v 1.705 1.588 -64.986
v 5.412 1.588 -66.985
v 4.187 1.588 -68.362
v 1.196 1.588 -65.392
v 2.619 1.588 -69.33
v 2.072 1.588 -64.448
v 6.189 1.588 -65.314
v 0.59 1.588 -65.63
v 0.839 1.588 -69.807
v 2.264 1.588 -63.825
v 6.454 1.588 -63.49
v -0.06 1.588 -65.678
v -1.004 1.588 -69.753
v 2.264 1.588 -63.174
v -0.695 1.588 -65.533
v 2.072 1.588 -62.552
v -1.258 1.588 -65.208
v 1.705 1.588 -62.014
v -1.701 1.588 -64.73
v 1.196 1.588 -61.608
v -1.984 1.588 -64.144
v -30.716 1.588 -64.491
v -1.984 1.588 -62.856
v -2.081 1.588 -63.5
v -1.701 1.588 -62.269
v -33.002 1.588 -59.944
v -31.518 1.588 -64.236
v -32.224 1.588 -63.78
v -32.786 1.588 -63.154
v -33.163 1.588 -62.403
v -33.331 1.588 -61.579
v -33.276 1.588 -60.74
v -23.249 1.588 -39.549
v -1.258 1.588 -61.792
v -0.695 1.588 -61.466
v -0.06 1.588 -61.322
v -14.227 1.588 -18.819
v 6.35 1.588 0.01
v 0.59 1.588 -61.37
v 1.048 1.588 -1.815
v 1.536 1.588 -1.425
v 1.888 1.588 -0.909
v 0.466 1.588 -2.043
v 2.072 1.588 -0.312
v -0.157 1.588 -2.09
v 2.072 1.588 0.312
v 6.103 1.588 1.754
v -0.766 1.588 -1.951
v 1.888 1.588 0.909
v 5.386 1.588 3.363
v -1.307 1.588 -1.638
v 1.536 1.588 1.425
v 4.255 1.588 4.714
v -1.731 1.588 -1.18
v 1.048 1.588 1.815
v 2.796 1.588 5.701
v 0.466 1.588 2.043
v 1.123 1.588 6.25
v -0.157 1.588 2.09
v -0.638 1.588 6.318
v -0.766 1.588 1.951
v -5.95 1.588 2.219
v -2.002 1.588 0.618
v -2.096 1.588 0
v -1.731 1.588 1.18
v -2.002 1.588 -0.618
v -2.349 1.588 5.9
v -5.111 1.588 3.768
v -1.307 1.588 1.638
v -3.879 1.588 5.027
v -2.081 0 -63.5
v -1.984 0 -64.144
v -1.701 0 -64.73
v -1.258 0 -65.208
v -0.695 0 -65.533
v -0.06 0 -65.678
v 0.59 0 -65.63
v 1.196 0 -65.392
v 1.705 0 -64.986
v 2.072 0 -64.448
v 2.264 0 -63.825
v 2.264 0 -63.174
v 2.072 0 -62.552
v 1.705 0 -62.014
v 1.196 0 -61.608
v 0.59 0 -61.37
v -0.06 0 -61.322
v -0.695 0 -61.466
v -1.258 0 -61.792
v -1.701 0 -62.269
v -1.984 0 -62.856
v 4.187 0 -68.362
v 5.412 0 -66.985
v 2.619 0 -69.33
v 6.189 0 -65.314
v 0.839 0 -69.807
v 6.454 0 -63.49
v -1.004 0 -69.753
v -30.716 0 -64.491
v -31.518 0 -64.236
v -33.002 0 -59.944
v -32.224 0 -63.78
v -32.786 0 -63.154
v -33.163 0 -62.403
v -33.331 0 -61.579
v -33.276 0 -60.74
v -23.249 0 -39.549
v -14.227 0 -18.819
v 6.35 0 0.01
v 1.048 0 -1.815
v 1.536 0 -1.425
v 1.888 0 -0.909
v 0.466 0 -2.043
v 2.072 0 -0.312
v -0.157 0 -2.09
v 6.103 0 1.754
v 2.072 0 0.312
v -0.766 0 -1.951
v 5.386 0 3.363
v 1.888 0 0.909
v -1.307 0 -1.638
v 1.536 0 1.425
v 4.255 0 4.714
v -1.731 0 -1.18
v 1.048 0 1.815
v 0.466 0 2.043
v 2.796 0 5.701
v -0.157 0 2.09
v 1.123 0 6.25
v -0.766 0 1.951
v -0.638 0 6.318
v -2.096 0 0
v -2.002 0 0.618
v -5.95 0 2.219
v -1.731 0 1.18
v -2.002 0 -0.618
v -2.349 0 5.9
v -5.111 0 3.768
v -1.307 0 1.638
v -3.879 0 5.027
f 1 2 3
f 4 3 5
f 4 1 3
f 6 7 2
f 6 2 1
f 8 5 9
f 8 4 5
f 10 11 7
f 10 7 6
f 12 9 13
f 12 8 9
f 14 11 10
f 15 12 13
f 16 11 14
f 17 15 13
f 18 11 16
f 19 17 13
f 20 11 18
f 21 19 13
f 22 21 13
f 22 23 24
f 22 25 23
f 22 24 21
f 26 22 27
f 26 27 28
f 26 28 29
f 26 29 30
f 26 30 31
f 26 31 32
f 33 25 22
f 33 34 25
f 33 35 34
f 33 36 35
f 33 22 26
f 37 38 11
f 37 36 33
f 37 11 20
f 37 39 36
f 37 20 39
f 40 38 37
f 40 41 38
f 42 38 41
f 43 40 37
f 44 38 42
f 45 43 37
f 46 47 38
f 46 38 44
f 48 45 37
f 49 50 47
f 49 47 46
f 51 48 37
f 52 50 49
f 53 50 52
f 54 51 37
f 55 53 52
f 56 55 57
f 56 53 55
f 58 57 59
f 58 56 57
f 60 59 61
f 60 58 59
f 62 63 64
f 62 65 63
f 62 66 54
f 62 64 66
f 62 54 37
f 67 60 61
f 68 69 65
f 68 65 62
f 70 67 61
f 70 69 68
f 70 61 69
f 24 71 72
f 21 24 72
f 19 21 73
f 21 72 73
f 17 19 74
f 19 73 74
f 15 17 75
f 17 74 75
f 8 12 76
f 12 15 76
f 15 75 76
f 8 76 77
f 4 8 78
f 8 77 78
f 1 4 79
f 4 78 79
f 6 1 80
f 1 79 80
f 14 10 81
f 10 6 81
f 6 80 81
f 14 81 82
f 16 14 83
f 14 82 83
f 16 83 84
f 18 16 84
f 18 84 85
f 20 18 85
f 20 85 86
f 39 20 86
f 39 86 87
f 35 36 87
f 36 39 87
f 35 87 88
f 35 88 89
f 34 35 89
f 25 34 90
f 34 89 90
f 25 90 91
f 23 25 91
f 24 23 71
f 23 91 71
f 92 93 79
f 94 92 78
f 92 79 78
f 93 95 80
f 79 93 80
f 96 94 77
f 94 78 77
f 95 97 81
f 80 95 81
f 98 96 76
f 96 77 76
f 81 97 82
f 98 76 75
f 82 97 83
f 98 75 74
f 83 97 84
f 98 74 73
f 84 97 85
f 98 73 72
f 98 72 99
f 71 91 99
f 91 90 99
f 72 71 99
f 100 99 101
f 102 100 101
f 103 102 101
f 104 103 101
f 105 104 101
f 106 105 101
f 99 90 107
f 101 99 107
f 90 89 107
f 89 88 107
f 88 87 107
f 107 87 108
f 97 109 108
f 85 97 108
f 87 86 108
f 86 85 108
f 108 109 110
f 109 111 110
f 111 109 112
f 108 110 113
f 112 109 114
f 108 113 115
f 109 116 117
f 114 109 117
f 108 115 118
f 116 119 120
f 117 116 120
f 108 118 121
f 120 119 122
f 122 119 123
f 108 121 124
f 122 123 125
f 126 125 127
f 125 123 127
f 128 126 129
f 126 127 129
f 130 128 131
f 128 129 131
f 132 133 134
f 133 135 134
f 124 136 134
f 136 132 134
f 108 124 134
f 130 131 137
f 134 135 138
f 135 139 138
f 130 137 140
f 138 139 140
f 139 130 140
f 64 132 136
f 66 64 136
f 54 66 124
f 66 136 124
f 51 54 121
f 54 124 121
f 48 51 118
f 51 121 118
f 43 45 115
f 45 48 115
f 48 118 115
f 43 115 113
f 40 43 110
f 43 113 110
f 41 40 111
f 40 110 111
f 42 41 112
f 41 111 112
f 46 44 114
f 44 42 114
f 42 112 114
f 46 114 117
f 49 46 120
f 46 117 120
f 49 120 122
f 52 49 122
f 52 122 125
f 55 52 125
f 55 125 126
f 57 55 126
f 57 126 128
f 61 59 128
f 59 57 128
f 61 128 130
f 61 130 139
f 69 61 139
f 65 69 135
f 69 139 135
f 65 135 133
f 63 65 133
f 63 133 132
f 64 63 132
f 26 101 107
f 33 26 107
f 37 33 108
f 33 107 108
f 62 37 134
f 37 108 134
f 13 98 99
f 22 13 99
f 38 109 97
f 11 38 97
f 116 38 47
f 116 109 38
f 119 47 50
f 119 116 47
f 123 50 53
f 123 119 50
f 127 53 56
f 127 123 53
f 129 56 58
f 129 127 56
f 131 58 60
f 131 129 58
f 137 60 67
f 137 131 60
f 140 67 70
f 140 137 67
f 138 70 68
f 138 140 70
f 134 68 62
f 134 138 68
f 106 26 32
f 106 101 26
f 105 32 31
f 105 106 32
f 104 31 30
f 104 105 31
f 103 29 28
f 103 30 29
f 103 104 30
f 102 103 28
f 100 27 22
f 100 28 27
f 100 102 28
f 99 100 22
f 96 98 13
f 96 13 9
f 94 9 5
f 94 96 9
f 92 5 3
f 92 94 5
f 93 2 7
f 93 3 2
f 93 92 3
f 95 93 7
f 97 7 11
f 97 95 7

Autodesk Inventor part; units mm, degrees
ref_plane "YZ Plane" through (0, 0, 0) normal (1, 0, 0) x (0, 1, 0)
ref_plane "XZ Plane" through (0, 0, 0) normal (0, 1, 0) x (-1, 0, 0)
ref_plane "XY Plane" through (0, 0, 0) normal (0, 0, 1) x (1, 0, 0)
sketch "main" plane through (0, 0, 0) normal (0, 0, 1) x (1, 0, 0)
  circle A0 centre (31.4944, -42.9627) radius 2.1844
  arc A1 (31.4944, -49.3127) -> (37.7453, -41.8453) centre (31.4944, -42.9627) ccw
  arc A2 (-34.2347, -37.0168) -> (-32.0056, -49.3127) centre (-32.0056, -42.9627) ccw
  arc A3 (-34.2347, -37.0168) -> (27.8848, -9.8628) centre (-257.1487, 557.5708) ccw
  line L0 (37.7453, -41.8453) -> (32.4355, -12.1413)
  line L1 (-32.0056, -49.3127) -> (31.4944, -49.3127)
  arc A4 (32.4355, -12.1413) -> (27.8848, -9.8628) centre (29.31, -12.7) ccw
  circle A5 centre (-32.0056, -42.9627) radius 2.0955
  point P0 (5.1717, -33.3366)
  point P1 (31.6842, -7.9384)
  dimension "d0" = 1270
  dimension "d1" = 12.7
  dimension "d2" = 12.7
  dimension "d3" = 3.175
  dimension "d4" = 4.191
sketch "Sketch1" plane through (0, 0, 0) normal (0, 1, 0) x (-1, 0, 0)
  circle A0 centre (-0.1035, -63.4999) radius 2.1844
  arc A1 (-6.4535, -63.4896) -> (1.0037, -69.7526) centre (-0.1035, -63.4999) ccw
  arc A2 (5.9495, 2.2194) -> (-6.35, 0.0103) centre (0, 0) ccw
  arc A3 (5.9495, 2.2194) -> (33.0022, -59.9443) centre (600.8995, 224.1642) ccw
  line L0 (1.0037, -69.7526) -> (30.7163, -64.4912)
  line L1 (-6.35, 0.0103) -> (-6.4535, -63.4896)
  arc A4 (30.7163, -64.4912) -> (33.0022, -59.9443) centre (30.1627, -61.3648) ccw
  circle A5 centre (0, 0) radius 2.0955
  point P0 (0, 0)
extrude "Extrusion1" add sketch "Sketch1" along normal blind 1.5875
properties part number "Magazine Gusset" material "Acetal Resin, White"
